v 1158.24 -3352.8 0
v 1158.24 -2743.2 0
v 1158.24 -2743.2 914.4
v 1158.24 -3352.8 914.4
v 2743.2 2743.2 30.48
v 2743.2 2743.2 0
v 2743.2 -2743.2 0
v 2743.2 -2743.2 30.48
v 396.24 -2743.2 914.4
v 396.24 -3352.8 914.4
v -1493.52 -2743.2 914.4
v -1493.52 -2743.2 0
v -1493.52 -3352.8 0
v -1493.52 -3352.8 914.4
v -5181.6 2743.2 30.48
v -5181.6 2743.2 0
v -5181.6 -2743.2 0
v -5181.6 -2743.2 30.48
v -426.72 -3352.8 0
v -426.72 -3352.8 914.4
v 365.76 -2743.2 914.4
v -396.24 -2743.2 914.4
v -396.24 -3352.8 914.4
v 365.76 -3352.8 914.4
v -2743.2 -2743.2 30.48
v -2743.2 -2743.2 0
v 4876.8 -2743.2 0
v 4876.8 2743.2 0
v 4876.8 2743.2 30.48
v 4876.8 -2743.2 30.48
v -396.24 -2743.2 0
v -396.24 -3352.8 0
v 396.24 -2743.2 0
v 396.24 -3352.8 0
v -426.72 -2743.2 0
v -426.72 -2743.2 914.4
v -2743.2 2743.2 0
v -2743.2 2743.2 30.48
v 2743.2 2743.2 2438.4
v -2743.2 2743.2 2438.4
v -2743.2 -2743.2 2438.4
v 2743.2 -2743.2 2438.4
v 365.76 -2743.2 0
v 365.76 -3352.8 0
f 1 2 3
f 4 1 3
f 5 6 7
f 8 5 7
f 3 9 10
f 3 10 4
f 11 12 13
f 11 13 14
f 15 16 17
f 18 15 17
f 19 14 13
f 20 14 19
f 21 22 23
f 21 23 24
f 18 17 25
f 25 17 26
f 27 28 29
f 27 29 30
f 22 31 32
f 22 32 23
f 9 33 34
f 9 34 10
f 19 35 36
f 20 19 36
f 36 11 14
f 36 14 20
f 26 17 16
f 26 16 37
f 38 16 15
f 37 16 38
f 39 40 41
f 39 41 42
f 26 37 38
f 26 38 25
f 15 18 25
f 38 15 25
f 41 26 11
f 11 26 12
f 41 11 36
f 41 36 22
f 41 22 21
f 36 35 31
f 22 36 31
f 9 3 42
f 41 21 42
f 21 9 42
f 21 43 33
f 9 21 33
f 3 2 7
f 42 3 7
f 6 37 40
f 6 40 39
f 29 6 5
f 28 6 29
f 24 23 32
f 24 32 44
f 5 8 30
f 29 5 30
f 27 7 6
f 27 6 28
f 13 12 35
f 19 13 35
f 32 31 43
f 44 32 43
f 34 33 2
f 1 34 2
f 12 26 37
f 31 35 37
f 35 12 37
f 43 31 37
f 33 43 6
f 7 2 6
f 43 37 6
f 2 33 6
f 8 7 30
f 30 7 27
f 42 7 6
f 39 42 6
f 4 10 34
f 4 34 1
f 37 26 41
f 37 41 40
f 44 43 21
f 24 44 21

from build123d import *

# Parameters (mm, degrees)
F0_W     = 5486.4
F0_H     = 5486.4
F1_DEPTH = 2438.4
F2_W     = 1066.8
F2_H     = 914.4
F2_W_2   = 762
F3_DEPTH = 609.6
F4_W     = 2438.4
F4_H     = 5486.4
F4_W_2   = 2133.6
F5_DEPTH = 30.48


with BuildPart() as f1:
    # F0 (on Top) → F1 (new body)
    with BuildSketch(Plane.XY):
        Rectangle(F0_W, F0_H)
    extrude(amount=F1_DEPTH)

    # F2 (on face) → F3 (join)
    with BuildSketch(Plane.XZ.offset(2743.2)):
        with Locations((-960.12, 457.2)):
            Rectangle(F2_W, F2_H)
        with Locations((-15.24, 457.2)):
            Rectangle(F2_W_2, F2_H)
        with Locations((777.24, 457.2)):
            Rectangle(F2_W_2, F2_H)
    extrude(amount=F3_DEPTH)


with BuildPart() as f5:
    # F4 (on face) → F5 (new body)
    with BuildSketch(Plane(origin=(0, 0, 0), x_dir=(1, 0, 0), z_dir=(0, 0, -1))):
        with Locations((-3962.4, 0)):
            Rectangle(F4_W, F4_H)
        with Locations((3810, 0)):
            Rectangle(F4_W_2, F4_H)
    extrude(amount=-F5_DEPTH)


solid = Compound([f1.part, f5.part])
